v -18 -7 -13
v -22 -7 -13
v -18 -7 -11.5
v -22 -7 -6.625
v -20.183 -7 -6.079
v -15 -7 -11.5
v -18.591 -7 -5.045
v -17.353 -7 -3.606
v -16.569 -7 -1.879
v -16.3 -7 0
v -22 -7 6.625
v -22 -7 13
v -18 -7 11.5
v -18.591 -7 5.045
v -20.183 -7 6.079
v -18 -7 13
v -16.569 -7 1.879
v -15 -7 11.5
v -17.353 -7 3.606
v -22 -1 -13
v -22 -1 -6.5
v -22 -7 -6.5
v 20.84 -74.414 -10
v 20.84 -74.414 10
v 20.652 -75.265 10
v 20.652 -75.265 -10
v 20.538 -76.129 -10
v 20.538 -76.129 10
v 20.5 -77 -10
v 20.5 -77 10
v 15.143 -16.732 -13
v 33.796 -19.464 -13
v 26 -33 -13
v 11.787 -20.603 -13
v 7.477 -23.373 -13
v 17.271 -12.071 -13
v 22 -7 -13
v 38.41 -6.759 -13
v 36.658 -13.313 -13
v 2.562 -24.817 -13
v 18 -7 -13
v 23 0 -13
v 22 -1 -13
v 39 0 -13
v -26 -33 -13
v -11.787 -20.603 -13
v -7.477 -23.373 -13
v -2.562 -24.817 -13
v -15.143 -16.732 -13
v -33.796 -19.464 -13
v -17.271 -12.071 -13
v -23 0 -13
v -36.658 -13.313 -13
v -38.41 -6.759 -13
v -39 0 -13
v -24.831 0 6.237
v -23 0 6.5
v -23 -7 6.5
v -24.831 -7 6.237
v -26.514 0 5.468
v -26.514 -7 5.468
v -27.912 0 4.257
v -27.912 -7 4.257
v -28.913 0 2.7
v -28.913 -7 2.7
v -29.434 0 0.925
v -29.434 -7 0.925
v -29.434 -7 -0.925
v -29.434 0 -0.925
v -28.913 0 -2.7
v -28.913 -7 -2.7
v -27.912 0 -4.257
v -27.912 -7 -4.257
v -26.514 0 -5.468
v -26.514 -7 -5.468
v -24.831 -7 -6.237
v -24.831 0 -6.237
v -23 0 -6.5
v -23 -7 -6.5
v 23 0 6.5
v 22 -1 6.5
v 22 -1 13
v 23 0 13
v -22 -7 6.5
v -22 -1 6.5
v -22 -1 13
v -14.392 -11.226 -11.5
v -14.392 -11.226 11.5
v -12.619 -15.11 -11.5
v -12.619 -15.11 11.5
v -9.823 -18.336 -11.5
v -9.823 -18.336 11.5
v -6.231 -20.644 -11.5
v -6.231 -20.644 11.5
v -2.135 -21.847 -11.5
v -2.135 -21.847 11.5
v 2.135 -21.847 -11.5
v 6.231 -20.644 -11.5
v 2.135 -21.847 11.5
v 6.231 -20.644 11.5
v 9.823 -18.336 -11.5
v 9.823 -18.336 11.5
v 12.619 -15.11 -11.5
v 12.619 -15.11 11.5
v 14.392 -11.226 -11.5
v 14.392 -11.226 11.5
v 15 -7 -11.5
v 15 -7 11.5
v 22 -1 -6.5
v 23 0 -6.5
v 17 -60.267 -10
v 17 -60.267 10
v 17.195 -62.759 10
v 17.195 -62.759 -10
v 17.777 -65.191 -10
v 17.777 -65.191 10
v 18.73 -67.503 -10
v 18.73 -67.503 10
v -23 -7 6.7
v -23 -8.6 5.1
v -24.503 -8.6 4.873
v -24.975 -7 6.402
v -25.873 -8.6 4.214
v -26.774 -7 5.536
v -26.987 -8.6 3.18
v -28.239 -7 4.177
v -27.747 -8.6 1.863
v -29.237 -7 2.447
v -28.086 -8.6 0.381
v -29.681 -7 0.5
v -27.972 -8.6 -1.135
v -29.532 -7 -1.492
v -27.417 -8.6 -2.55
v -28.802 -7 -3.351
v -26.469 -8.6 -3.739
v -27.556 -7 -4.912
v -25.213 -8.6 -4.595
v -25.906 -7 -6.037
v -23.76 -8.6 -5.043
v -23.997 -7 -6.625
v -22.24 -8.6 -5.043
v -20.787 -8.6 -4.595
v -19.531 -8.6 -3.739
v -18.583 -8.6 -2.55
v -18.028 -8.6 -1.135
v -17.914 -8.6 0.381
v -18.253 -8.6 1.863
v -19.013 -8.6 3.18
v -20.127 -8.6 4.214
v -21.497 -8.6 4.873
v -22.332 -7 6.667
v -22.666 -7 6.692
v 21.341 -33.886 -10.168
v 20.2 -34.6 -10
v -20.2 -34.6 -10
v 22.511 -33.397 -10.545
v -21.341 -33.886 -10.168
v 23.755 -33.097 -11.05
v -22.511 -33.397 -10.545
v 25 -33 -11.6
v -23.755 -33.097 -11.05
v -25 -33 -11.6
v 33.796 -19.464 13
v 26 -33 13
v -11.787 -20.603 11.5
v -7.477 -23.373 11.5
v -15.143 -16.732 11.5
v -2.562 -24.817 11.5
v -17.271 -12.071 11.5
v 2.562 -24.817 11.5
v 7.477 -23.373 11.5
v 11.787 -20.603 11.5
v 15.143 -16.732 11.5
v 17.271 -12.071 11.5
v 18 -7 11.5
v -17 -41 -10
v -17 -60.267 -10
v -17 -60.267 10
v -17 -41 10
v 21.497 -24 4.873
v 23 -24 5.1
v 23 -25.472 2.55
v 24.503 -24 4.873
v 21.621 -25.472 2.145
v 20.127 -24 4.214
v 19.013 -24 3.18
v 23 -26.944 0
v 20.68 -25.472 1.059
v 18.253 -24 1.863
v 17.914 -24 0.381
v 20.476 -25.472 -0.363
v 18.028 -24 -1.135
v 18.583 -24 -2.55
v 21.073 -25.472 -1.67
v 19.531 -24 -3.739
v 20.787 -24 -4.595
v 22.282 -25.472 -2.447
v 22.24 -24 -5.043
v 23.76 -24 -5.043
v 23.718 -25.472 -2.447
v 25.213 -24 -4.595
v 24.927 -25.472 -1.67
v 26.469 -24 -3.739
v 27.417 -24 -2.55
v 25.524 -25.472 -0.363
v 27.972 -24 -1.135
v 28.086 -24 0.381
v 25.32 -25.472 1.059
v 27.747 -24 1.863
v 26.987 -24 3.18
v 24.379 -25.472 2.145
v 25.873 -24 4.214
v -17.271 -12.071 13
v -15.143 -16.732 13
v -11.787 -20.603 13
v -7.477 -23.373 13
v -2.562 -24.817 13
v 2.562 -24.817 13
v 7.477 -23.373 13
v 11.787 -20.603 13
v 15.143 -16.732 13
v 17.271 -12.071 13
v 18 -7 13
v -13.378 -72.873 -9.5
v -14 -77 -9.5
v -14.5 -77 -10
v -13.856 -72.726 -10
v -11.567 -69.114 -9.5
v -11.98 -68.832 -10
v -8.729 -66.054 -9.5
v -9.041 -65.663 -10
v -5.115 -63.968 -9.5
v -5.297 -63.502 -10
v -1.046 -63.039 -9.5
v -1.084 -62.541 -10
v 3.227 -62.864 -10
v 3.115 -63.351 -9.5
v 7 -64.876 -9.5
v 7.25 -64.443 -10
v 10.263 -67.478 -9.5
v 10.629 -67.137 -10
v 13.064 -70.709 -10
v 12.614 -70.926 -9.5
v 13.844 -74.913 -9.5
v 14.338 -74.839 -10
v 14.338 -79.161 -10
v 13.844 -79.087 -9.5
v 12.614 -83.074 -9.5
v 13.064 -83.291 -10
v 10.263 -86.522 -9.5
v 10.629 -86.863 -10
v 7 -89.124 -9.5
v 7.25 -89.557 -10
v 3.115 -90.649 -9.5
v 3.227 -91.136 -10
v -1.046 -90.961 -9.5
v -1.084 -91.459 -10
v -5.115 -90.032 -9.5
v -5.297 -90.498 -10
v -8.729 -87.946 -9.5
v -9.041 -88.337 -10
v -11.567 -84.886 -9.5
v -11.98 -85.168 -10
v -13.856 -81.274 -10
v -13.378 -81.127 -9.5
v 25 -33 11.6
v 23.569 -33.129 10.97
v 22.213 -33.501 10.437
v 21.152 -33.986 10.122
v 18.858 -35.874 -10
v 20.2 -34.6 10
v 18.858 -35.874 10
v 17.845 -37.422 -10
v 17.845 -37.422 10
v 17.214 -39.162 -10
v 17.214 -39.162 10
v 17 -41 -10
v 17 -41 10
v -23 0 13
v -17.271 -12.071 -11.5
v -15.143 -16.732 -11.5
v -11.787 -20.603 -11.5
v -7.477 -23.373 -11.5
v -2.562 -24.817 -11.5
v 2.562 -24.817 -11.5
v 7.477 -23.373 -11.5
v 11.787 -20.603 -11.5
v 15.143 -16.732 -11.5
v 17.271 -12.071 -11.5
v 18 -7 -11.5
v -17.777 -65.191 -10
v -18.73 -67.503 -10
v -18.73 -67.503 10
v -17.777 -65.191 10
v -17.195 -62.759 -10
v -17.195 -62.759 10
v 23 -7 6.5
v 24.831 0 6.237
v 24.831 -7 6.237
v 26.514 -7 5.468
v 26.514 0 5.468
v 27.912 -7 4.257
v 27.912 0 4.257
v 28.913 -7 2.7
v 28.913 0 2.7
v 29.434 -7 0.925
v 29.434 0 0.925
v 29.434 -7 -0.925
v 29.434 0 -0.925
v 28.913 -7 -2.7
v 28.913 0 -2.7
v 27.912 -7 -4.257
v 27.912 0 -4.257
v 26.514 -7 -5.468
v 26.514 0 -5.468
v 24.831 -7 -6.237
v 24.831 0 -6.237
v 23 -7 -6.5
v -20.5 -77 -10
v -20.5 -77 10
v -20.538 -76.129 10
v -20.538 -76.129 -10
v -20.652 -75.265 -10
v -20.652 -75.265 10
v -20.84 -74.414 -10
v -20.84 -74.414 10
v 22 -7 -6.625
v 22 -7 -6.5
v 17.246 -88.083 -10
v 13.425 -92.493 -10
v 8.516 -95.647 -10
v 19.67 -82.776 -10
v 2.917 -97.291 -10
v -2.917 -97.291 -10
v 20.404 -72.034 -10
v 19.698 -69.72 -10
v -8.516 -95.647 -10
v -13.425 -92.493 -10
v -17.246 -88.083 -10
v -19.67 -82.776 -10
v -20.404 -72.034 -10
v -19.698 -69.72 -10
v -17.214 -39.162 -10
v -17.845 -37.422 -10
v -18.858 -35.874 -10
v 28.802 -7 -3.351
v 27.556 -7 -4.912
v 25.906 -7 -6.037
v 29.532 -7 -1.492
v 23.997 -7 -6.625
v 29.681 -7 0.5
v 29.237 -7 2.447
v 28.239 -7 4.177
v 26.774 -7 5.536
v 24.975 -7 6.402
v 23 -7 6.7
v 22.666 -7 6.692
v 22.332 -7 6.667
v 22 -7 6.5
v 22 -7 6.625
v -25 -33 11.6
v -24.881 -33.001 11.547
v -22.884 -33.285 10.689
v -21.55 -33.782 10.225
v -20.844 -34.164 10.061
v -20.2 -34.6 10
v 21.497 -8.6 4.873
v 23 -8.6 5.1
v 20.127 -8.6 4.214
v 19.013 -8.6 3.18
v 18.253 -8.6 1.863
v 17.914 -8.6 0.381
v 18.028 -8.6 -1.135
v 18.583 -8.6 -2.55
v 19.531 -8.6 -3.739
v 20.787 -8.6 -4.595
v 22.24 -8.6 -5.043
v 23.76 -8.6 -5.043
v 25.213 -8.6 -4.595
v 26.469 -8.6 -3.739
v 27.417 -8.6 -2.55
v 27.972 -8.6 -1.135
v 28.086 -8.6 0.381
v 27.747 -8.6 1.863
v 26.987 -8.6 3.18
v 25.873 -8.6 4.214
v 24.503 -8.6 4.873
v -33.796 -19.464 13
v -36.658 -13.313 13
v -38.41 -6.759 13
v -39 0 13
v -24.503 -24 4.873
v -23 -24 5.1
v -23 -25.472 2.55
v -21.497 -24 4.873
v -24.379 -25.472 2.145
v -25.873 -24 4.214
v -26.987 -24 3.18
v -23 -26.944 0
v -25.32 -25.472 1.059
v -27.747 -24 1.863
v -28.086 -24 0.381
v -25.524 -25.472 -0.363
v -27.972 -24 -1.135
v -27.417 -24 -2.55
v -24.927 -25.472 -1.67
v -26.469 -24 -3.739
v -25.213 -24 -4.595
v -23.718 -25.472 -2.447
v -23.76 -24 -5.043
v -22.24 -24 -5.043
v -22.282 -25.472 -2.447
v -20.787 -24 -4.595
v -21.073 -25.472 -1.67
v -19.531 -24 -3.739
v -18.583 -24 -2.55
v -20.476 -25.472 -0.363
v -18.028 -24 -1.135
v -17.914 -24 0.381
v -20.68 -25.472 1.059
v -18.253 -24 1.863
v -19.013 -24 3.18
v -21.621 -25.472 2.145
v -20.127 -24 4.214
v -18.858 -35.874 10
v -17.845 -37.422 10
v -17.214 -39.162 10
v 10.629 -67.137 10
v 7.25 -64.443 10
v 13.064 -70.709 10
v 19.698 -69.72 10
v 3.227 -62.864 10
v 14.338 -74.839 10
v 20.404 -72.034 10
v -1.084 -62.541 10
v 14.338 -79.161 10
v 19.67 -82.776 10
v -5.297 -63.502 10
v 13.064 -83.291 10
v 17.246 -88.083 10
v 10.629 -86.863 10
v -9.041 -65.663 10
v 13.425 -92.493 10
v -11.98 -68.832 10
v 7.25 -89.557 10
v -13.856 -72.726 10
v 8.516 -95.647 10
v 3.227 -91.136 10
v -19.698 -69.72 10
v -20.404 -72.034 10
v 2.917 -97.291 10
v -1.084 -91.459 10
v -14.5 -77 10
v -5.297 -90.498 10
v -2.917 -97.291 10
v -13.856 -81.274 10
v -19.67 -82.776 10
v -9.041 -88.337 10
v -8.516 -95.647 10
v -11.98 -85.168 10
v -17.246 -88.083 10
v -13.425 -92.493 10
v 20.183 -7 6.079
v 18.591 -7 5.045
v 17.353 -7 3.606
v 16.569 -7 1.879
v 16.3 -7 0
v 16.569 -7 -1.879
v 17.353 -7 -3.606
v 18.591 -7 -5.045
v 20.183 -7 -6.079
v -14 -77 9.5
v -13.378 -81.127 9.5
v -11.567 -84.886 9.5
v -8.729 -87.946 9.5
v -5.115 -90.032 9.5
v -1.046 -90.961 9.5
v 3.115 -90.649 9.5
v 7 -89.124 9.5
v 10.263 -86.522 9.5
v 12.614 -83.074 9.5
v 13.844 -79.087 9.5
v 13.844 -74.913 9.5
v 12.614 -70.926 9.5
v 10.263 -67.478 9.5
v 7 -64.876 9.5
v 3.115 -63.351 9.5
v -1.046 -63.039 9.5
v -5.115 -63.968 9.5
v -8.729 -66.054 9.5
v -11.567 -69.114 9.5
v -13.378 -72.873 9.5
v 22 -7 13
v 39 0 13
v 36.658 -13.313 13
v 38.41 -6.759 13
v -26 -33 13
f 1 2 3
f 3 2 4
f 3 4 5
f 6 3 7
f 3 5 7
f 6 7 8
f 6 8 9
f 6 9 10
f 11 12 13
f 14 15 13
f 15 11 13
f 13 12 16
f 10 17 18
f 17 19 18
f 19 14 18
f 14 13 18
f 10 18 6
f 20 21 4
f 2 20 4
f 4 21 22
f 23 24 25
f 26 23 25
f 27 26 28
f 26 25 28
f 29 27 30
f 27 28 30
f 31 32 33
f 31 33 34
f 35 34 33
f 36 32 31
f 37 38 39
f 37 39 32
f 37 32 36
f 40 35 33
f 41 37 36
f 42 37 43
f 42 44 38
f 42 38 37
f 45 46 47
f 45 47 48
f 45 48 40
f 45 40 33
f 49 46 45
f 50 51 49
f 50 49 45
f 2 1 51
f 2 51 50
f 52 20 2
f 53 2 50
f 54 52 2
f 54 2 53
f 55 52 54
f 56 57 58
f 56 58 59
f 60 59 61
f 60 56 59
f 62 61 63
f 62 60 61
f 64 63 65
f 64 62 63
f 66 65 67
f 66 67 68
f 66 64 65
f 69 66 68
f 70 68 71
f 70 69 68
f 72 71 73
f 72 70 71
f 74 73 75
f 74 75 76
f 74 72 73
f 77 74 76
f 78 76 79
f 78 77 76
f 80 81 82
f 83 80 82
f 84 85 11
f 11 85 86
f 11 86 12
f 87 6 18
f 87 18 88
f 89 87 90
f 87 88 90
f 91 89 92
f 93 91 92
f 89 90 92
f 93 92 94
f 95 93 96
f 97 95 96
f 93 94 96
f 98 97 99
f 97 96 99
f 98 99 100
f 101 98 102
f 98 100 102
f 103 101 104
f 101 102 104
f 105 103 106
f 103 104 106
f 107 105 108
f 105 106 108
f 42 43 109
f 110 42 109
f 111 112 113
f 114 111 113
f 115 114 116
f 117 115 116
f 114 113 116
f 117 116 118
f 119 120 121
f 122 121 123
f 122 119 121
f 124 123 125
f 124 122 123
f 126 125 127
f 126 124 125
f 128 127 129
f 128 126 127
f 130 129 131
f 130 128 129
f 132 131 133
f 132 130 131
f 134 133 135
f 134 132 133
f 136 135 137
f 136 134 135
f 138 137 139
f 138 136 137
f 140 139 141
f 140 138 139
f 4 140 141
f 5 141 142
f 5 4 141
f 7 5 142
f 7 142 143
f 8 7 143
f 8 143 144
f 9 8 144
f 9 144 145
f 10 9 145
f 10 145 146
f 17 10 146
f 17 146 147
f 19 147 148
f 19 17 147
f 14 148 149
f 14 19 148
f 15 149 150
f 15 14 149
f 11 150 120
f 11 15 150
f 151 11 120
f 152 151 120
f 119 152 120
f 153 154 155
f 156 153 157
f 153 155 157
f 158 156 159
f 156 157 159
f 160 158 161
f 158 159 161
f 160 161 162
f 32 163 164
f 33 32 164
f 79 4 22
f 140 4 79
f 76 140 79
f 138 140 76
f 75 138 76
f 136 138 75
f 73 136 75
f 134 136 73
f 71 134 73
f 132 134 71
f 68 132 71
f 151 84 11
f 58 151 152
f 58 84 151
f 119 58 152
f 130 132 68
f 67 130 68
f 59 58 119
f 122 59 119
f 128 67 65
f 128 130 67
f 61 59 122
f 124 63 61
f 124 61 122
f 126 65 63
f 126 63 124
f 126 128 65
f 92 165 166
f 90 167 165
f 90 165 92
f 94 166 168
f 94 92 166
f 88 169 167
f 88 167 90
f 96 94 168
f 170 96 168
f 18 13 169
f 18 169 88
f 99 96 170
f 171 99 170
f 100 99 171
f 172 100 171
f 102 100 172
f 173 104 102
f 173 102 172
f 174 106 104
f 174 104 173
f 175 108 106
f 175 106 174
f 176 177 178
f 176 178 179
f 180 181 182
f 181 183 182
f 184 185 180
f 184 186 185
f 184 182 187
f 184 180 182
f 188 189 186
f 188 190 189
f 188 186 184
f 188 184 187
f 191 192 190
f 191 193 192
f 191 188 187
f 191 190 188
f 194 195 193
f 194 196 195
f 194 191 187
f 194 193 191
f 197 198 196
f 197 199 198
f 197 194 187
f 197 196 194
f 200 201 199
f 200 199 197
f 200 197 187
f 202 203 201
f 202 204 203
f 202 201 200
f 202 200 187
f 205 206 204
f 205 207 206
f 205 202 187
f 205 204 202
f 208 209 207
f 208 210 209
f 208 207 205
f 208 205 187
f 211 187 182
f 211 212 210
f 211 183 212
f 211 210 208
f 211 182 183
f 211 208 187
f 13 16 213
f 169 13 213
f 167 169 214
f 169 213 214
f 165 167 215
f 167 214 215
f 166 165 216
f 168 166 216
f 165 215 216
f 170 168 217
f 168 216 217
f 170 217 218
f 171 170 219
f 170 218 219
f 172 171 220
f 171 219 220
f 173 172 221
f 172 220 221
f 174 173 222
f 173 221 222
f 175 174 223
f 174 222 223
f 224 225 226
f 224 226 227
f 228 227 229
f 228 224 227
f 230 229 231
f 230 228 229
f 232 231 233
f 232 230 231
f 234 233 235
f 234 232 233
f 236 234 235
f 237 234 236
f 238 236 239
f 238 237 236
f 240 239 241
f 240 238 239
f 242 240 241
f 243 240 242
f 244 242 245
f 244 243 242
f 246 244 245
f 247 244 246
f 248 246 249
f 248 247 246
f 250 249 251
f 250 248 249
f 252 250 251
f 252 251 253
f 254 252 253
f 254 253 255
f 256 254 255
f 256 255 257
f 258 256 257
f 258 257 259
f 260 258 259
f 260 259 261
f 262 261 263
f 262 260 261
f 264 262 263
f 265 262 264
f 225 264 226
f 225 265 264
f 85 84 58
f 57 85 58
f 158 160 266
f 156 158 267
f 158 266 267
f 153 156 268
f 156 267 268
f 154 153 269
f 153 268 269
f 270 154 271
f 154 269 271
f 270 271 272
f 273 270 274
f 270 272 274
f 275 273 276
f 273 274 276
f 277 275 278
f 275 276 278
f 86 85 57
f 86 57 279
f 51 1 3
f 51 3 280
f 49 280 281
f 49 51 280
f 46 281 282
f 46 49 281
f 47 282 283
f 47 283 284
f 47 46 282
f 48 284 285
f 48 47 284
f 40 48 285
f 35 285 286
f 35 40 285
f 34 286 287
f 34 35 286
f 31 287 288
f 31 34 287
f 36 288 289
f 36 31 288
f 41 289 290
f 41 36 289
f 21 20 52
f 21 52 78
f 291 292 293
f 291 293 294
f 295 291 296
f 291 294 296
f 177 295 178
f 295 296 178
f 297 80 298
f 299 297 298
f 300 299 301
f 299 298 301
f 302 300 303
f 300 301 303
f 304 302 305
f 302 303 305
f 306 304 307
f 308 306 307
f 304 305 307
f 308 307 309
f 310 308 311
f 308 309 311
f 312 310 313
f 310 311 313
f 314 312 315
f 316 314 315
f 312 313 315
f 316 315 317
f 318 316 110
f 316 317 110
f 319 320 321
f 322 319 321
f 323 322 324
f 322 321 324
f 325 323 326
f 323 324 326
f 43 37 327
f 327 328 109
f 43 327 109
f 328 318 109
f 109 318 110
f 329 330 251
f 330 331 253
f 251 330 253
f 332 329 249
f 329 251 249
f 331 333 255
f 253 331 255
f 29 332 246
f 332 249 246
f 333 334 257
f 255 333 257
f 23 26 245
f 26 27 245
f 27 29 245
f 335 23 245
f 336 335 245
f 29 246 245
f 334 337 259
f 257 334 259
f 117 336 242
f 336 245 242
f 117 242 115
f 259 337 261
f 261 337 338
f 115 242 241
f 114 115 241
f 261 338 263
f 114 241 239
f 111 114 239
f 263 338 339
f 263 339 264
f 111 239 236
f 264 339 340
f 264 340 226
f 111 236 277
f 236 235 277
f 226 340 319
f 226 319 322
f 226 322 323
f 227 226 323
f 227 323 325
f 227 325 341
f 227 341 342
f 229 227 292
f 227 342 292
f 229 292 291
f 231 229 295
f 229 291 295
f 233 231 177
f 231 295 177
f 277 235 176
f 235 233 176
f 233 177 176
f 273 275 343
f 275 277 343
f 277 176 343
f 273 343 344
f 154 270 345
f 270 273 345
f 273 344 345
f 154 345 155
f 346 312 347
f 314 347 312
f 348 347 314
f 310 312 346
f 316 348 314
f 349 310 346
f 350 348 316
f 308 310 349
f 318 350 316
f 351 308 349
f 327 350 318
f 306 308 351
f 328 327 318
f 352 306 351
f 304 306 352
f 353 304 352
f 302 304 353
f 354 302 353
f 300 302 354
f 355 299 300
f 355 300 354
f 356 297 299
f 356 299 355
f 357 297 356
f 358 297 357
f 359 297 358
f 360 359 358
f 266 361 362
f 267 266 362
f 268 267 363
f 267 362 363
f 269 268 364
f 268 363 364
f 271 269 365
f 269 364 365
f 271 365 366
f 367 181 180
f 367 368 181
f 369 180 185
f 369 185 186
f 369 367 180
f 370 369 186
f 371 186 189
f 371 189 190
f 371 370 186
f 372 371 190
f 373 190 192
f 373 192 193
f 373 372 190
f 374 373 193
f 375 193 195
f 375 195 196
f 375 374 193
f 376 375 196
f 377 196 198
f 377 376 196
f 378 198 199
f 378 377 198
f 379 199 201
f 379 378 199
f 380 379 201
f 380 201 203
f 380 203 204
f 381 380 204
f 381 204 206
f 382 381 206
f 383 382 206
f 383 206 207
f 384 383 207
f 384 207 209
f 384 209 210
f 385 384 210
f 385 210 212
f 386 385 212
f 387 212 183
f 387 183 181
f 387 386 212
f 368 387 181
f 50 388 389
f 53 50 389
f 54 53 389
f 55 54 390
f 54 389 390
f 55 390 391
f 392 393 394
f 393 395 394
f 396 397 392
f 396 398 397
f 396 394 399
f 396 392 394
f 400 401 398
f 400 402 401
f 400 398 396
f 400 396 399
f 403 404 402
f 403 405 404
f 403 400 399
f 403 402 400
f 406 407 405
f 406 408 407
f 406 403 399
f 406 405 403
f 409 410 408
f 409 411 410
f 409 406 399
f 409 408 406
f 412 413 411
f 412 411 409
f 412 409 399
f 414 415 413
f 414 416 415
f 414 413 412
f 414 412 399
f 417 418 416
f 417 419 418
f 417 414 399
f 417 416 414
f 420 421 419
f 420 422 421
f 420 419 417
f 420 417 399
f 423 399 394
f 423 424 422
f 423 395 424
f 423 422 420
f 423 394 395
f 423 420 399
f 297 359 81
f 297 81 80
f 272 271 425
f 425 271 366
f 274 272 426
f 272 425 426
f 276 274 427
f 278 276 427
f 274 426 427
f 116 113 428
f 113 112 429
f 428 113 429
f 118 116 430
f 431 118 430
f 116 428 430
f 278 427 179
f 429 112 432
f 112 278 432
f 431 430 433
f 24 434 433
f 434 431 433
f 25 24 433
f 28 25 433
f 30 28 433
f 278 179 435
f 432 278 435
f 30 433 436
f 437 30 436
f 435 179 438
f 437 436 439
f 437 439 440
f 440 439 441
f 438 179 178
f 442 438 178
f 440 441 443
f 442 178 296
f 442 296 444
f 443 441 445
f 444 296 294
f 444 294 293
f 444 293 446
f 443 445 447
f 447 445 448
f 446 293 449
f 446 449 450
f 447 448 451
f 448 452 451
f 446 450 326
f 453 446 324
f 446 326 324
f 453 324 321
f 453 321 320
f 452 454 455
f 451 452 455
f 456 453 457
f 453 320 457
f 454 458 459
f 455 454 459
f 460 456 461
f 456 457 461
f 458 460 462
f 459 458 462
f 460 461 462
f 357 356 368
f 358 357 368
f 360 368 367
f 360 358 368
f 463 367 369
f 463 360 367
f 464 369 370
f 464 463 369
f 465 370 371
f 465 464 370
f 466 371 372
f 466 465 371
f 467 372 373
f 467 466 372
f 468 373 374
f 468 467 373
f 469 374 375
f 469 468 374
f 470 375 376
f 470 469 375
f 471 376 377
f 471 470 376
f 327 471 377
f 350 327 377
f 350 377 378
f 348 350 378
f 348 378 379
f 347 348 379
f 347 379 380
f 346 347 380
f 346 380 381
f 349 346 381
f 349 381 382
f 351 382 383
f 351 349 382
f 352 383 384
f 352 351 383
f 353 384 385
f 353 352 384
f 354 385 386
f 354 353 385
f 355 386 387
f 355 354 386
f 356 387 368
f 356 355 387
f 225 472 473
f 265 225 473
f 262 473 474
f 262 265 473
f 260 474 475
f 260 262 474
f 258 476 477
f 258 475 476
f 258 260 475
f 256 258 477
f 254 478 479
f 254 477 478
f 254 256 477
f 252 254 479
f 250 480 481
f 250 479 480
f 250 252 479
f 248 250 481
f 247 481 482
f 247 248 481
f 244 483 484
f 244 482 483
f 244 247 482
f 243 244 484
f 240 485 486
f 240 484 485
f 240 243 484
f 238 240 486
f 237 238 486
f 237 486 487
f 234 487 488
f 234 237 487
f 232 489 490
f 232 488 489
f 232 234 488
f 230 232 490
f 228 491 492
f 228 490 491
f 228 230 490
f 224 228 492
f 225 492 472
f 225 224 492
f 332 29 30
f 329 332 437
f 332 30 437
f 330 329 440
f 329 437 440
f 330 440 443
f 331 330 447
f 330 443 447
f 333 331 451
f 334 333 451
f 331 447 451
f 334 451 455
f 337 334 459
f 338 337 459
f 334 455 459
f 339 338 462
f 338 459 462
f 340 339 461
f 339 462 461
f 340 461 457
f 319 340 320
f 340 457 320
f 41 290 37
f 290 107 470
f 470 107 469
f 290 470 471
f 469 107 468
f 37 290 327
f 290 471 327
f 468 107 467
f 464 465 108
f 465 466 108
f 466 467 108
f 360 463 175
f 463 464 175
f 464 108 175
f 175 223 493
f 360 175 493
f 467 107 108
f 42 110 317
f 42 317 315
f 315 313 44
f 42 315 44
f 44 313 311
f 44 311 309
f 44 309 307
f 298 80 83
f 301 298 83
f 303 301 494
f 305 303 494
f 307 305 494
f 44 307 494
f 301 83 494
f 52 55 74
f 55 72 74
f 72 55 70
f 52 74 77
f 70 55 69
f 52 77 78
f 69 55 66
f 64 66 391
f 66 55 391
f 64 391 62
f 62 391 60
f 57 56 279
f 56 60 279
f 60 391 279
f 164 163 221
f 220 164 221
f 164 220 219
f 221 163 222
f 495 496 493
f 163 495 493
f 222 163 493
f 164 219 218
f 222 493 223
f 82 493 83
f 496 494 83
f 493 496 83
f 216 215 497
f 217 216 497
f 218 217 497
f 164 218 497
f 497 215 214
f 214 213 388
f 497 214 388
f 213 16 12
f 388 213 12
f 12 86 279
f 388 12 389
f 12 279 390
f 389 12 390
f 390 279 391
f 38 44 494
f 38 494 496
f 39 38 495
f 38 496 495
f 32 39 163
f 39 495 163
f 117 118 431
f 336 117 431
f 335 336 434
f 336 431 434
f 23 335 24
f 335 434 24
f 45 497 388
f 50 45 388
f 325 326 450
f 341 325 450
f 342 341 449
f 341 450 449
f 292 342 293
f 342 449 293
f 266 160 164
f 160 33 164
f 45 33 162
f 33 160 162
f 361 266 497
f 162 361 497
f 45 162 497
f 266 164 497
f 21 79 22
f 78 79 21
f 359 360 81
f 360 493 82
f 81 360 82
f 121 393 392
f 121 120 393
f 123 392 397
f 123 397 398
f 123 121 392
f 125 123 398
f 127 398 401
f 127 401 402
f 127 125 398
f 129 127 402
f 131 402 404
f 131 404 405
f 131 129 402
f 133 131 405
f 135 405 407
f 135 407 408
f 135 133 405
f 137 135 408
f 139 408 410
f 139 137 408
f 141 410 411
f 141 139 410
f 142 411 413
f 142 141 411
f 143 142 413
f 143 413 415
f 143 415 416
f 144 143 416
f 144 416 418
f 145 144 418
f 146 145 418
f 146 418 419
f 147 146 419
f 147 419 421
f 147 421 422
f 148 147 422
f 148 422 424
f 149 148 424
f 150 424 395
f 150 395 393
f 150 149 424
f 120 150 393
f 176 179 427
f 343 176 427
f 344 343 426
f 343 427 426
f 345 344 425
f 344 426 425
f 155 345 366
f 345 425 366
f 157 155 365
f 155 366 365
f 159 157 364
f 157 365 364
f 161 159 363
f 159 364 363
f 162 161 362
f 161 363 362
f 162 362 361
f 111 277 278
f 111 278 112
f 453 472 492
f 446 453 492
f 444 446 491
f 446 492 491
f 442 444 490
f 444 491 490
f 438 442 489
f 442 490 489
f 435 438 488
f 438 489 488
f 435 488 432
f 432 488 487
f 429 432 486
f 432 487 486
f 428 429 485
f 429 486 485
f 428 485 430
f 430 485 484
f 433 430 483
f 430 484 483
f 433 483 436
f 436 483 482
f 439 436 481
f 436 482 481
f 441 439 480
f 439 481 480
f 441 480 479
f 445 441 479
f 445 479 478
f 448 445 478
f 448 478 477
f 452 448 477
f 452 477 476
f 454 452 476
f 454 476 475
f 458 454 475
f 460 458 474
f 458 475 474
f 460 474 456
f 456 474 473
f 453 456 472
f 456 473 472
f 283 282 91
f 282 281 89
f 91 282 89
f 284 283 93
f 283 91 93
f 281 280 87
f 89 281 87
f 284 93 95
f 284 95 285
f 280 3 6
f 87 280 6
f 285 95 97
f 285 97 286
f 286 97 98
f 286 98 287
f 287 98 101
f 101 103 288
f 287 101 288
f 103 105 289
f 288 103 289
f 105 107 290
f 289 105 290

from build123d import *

# Parameters (mm, degrees)
SKETCH_1_R                  = 14
EXTRUDE_1_DEPTH             = 13
CUT_EXTRUDE_1_DEPTH         = 106.812333875
CUT_EXTRUDE_1_DEPTH_BACK    = 106.812333875
SKETCH_2_OUTSIDE_W          = 53.508
SKETCH_2_OUTSIDE_H          = 125.008
CUT_EXTRUDE_2_DEPTH         = 7
CHAMFER_1_SIZE              = 1
CHAMFER_2_SIZE              = 0.5
SKETCH_4_R                  = 18
CUT_EXTRUDE_3_DEPTH         = 1.5
HOLE_WIZARD_M121_AT_2_COUNT = 2
HOLE_WIZARD_M121_AT_2_PITCH = 46


with BuildPart() as part:
    # Эскиз1 → Бобышка-Вытянуть1 (new, symmetric)
    with BuildSketch(Plane.XY):
        with BuildLine():
            Line((33.795797544, -19.463917086), (26, -33))
            Line((26, -33), (25, -33))
            ThreePointArc((25, -33), (19.343145751, -35.343145751), (17, -41))
            Line((17, -41), (17, -60.266799469))
            ThreePointArc((17, -60.266799469), (17.438439597, -63.986723909), (18.72972973, -67.502778077))
            ThreePointArc((18.72972973, -67.502778077), (20.084453039, -70.866913818), (20.840163934, -74.413966902))
            ThreePointArc((20.840163934, -74.413966902), (20.58540569, -75.695845227), (20.5, -77))
            ThreePointArc((20.5, -77), (0, -97.5), (-20.5, -77))
            ThreePointArc((-20.5, -77), (-20.58540569, -75.695845227), (-20.840163934, -74.413966902))
            ThreePointArc((-20.840163934, -74.413966902), (-20.084453039, -70.866913818), (-18.72972973, -67.502778077))
            ThreePointArc((-18.72972973, -67.502778077), (-17.438439597, -63.986723909), (-17, -60.266799469))
            Line((-17, -60.266799469), (-17, -41))
            ThreePointArc((-17, -41), (-19.343145751, -35.343145751), (-25, -33))
            Line((-25, -33), (-26, -33))
            Line((-26, -33), (-33.795797544, -19.463917086))
            ThreePointArc((-33.795797544, -19.463917086), (-37.676492036, -10.073824889), (-39, 0))
            Line((-39, 0), (-22, 0))
            Line((-22, 0), (-22, -7))
            Line((-22, -7), (-15, -7))
            ThreePointArc((-15, -7), (0, -22), (15, -7))
            Line((15, -7), (22, -7))
            Line((22, -7), (22, 0))
            Line((22, 0), (39, 0))
            ThreePointArc((39, 0), (37.676492036, -10.073824889), (33.795797544, -19.463917086))
        make_face()
        with Locations(Location((0, -77, 0), (0, 0, 180))):
            Circle(SKETCH_1_R, mode=Mode.SUBTRACT)
    extrude(amount=EXTRUDE_1_DEPTH, both=True)

    # Эскиз2 outside → Вырез-Вытянуть1 (cut, two sides: drawn at the far end of the back side and taken through both)
    with BuildSketch(Plane(origin=(0, 0, 0), x_dir=(0, 0, -1), z_dir=(1, 0, 0)).offset(-CUT_EXTRUDE_1_DEPTH_BACK)):
        with Locations((0, -48.75)):
            Rectangle(SKETCH_2_OUTSIDE_W, SKETCH_2_OUTSIDE_H)
        with BuildLine():
            Line((13, 0), (-13, 0))
            Line((-13, 0), (-13, -33))
            Line((-13, -33), (-11.6, -33))
            ThreePointArc((-11.6, -33), (-10.46862915, -33.46862915), (-10, -34.6))
            Line((-10, -34.6), (-10, -97.5))
            Line((-10, -97.5), (10, -97.5))
            Line((10, -97.5), (10, -34.6))
            ThreePointArc((10, -34.6), (10.46862915, -33.46862915), (11.6, -33))
            Line((11.6, -33), (13, -33))
            Line((13, -33), (13, 0))
        make_face(mode=Mode.SUBTRACT)
    extrude(amount=CUT_EXTRUDE_1_DEPTH + CUT_EXTRUDE_1_DEPTH_BACK, mode=Mode.SUBTRACT)

    # Эскиз3 → Вырез-Вытянуть2 (cut)
    with BuildSketch(Plane(origin=(0, 0, 0), x_dir=(1, 0, 0), z_dir=(0, 1, 0))):
        with BuildLine():
            Line((23, 6.5), (22, 6.5))
            Line((22, 6.5), (22, -6.5))
            Line((22, -6.5), (23, -6.5))
            ThreePointArc((23, -6.5), (29.5, 0), (23, 6.5))
        make_face()
        with BuildLine():
            Line((-22, 6.5), (-22, -6.5))
            Line((-22, -6.5), (-23, -6.5))
            ThreePointArc((-23, -6.5), (-29.5, 0), (-23, 6.5))
            Line((-23, 6.5), (-22, 6.5))
        make_face()
    extrude(amount=-CUT_EXTRUDE_2_DEPTH, mode=Mode.SUBTRACT)

    # Фаска1
    chamfer_1_edges = [part.edges().sort_by_distance(p)[0] for p in [
        (22, 0, -9.75),
        (22, 0, 9.75),
        (-22, 0, 9.75),
        (-22, 0, -9.75),
    ]]
    chamfer(chamfer_1_edges, length=CHAMFER_1_SIZE)

    # Фаска2
    chamfer_2_edges = [part.edges().sort_by_distance(p)[0] for p in [
        (14, -77, -10),
        (14, -77, 10),
    ]]
    chamfer(chamfer_2_edges, length=CHAMFER_2_SIZE)

    # Эскиз4 → Вырез-Вытянуть3 (cut)
    with BuildSketch(Plane.XY.offset(13)):
        with Locations((0, -7)):
            Circle(SKETCH_4_R)
    cut_extrude_3 = extrude(amount=-CUT_EXTRUDE_3_DEPTH, mode=Mode.SUBTRACT)

    # Зеркальное отражение1: Вырез-Вытянуть3 across plane
    add(cut_extrude_3.mirror(Plane.XY), mode=Mode.SUBTRACT)

    # Эскиз6 → Отверстие обработанное метчиком M121 (revolve, cut)
    with BuildSketch(Plane(origin=(-23, -7, 0), x_dir=(0, 0, 1), z_dir=(1, 0, 0))):
        Polygon((0, 0), (0, 19.944486373), (5.1, 17), (5.1, 1.6), (6.7, 0), align=None)
    hole_wizard_m121 = revolve(axis=Axis((-23, -0.65, 0), (0, -1, 0)), mode=Mode.SUBTRACT)

    # Отверстие обработанное метчиком M121 at 2: Отверстие обработанное метчиком M121 ×2
    with Locations(*[(i * HOLE_WIZARD_M121_AT_2_PITCH, 0, 0) for i in range(1, HOLE_WIZARD_M121_AT_2_COUNT)]):
        add(hole_wizard_m121, mode=Mode.SUBTRACT)


solid = part.part
